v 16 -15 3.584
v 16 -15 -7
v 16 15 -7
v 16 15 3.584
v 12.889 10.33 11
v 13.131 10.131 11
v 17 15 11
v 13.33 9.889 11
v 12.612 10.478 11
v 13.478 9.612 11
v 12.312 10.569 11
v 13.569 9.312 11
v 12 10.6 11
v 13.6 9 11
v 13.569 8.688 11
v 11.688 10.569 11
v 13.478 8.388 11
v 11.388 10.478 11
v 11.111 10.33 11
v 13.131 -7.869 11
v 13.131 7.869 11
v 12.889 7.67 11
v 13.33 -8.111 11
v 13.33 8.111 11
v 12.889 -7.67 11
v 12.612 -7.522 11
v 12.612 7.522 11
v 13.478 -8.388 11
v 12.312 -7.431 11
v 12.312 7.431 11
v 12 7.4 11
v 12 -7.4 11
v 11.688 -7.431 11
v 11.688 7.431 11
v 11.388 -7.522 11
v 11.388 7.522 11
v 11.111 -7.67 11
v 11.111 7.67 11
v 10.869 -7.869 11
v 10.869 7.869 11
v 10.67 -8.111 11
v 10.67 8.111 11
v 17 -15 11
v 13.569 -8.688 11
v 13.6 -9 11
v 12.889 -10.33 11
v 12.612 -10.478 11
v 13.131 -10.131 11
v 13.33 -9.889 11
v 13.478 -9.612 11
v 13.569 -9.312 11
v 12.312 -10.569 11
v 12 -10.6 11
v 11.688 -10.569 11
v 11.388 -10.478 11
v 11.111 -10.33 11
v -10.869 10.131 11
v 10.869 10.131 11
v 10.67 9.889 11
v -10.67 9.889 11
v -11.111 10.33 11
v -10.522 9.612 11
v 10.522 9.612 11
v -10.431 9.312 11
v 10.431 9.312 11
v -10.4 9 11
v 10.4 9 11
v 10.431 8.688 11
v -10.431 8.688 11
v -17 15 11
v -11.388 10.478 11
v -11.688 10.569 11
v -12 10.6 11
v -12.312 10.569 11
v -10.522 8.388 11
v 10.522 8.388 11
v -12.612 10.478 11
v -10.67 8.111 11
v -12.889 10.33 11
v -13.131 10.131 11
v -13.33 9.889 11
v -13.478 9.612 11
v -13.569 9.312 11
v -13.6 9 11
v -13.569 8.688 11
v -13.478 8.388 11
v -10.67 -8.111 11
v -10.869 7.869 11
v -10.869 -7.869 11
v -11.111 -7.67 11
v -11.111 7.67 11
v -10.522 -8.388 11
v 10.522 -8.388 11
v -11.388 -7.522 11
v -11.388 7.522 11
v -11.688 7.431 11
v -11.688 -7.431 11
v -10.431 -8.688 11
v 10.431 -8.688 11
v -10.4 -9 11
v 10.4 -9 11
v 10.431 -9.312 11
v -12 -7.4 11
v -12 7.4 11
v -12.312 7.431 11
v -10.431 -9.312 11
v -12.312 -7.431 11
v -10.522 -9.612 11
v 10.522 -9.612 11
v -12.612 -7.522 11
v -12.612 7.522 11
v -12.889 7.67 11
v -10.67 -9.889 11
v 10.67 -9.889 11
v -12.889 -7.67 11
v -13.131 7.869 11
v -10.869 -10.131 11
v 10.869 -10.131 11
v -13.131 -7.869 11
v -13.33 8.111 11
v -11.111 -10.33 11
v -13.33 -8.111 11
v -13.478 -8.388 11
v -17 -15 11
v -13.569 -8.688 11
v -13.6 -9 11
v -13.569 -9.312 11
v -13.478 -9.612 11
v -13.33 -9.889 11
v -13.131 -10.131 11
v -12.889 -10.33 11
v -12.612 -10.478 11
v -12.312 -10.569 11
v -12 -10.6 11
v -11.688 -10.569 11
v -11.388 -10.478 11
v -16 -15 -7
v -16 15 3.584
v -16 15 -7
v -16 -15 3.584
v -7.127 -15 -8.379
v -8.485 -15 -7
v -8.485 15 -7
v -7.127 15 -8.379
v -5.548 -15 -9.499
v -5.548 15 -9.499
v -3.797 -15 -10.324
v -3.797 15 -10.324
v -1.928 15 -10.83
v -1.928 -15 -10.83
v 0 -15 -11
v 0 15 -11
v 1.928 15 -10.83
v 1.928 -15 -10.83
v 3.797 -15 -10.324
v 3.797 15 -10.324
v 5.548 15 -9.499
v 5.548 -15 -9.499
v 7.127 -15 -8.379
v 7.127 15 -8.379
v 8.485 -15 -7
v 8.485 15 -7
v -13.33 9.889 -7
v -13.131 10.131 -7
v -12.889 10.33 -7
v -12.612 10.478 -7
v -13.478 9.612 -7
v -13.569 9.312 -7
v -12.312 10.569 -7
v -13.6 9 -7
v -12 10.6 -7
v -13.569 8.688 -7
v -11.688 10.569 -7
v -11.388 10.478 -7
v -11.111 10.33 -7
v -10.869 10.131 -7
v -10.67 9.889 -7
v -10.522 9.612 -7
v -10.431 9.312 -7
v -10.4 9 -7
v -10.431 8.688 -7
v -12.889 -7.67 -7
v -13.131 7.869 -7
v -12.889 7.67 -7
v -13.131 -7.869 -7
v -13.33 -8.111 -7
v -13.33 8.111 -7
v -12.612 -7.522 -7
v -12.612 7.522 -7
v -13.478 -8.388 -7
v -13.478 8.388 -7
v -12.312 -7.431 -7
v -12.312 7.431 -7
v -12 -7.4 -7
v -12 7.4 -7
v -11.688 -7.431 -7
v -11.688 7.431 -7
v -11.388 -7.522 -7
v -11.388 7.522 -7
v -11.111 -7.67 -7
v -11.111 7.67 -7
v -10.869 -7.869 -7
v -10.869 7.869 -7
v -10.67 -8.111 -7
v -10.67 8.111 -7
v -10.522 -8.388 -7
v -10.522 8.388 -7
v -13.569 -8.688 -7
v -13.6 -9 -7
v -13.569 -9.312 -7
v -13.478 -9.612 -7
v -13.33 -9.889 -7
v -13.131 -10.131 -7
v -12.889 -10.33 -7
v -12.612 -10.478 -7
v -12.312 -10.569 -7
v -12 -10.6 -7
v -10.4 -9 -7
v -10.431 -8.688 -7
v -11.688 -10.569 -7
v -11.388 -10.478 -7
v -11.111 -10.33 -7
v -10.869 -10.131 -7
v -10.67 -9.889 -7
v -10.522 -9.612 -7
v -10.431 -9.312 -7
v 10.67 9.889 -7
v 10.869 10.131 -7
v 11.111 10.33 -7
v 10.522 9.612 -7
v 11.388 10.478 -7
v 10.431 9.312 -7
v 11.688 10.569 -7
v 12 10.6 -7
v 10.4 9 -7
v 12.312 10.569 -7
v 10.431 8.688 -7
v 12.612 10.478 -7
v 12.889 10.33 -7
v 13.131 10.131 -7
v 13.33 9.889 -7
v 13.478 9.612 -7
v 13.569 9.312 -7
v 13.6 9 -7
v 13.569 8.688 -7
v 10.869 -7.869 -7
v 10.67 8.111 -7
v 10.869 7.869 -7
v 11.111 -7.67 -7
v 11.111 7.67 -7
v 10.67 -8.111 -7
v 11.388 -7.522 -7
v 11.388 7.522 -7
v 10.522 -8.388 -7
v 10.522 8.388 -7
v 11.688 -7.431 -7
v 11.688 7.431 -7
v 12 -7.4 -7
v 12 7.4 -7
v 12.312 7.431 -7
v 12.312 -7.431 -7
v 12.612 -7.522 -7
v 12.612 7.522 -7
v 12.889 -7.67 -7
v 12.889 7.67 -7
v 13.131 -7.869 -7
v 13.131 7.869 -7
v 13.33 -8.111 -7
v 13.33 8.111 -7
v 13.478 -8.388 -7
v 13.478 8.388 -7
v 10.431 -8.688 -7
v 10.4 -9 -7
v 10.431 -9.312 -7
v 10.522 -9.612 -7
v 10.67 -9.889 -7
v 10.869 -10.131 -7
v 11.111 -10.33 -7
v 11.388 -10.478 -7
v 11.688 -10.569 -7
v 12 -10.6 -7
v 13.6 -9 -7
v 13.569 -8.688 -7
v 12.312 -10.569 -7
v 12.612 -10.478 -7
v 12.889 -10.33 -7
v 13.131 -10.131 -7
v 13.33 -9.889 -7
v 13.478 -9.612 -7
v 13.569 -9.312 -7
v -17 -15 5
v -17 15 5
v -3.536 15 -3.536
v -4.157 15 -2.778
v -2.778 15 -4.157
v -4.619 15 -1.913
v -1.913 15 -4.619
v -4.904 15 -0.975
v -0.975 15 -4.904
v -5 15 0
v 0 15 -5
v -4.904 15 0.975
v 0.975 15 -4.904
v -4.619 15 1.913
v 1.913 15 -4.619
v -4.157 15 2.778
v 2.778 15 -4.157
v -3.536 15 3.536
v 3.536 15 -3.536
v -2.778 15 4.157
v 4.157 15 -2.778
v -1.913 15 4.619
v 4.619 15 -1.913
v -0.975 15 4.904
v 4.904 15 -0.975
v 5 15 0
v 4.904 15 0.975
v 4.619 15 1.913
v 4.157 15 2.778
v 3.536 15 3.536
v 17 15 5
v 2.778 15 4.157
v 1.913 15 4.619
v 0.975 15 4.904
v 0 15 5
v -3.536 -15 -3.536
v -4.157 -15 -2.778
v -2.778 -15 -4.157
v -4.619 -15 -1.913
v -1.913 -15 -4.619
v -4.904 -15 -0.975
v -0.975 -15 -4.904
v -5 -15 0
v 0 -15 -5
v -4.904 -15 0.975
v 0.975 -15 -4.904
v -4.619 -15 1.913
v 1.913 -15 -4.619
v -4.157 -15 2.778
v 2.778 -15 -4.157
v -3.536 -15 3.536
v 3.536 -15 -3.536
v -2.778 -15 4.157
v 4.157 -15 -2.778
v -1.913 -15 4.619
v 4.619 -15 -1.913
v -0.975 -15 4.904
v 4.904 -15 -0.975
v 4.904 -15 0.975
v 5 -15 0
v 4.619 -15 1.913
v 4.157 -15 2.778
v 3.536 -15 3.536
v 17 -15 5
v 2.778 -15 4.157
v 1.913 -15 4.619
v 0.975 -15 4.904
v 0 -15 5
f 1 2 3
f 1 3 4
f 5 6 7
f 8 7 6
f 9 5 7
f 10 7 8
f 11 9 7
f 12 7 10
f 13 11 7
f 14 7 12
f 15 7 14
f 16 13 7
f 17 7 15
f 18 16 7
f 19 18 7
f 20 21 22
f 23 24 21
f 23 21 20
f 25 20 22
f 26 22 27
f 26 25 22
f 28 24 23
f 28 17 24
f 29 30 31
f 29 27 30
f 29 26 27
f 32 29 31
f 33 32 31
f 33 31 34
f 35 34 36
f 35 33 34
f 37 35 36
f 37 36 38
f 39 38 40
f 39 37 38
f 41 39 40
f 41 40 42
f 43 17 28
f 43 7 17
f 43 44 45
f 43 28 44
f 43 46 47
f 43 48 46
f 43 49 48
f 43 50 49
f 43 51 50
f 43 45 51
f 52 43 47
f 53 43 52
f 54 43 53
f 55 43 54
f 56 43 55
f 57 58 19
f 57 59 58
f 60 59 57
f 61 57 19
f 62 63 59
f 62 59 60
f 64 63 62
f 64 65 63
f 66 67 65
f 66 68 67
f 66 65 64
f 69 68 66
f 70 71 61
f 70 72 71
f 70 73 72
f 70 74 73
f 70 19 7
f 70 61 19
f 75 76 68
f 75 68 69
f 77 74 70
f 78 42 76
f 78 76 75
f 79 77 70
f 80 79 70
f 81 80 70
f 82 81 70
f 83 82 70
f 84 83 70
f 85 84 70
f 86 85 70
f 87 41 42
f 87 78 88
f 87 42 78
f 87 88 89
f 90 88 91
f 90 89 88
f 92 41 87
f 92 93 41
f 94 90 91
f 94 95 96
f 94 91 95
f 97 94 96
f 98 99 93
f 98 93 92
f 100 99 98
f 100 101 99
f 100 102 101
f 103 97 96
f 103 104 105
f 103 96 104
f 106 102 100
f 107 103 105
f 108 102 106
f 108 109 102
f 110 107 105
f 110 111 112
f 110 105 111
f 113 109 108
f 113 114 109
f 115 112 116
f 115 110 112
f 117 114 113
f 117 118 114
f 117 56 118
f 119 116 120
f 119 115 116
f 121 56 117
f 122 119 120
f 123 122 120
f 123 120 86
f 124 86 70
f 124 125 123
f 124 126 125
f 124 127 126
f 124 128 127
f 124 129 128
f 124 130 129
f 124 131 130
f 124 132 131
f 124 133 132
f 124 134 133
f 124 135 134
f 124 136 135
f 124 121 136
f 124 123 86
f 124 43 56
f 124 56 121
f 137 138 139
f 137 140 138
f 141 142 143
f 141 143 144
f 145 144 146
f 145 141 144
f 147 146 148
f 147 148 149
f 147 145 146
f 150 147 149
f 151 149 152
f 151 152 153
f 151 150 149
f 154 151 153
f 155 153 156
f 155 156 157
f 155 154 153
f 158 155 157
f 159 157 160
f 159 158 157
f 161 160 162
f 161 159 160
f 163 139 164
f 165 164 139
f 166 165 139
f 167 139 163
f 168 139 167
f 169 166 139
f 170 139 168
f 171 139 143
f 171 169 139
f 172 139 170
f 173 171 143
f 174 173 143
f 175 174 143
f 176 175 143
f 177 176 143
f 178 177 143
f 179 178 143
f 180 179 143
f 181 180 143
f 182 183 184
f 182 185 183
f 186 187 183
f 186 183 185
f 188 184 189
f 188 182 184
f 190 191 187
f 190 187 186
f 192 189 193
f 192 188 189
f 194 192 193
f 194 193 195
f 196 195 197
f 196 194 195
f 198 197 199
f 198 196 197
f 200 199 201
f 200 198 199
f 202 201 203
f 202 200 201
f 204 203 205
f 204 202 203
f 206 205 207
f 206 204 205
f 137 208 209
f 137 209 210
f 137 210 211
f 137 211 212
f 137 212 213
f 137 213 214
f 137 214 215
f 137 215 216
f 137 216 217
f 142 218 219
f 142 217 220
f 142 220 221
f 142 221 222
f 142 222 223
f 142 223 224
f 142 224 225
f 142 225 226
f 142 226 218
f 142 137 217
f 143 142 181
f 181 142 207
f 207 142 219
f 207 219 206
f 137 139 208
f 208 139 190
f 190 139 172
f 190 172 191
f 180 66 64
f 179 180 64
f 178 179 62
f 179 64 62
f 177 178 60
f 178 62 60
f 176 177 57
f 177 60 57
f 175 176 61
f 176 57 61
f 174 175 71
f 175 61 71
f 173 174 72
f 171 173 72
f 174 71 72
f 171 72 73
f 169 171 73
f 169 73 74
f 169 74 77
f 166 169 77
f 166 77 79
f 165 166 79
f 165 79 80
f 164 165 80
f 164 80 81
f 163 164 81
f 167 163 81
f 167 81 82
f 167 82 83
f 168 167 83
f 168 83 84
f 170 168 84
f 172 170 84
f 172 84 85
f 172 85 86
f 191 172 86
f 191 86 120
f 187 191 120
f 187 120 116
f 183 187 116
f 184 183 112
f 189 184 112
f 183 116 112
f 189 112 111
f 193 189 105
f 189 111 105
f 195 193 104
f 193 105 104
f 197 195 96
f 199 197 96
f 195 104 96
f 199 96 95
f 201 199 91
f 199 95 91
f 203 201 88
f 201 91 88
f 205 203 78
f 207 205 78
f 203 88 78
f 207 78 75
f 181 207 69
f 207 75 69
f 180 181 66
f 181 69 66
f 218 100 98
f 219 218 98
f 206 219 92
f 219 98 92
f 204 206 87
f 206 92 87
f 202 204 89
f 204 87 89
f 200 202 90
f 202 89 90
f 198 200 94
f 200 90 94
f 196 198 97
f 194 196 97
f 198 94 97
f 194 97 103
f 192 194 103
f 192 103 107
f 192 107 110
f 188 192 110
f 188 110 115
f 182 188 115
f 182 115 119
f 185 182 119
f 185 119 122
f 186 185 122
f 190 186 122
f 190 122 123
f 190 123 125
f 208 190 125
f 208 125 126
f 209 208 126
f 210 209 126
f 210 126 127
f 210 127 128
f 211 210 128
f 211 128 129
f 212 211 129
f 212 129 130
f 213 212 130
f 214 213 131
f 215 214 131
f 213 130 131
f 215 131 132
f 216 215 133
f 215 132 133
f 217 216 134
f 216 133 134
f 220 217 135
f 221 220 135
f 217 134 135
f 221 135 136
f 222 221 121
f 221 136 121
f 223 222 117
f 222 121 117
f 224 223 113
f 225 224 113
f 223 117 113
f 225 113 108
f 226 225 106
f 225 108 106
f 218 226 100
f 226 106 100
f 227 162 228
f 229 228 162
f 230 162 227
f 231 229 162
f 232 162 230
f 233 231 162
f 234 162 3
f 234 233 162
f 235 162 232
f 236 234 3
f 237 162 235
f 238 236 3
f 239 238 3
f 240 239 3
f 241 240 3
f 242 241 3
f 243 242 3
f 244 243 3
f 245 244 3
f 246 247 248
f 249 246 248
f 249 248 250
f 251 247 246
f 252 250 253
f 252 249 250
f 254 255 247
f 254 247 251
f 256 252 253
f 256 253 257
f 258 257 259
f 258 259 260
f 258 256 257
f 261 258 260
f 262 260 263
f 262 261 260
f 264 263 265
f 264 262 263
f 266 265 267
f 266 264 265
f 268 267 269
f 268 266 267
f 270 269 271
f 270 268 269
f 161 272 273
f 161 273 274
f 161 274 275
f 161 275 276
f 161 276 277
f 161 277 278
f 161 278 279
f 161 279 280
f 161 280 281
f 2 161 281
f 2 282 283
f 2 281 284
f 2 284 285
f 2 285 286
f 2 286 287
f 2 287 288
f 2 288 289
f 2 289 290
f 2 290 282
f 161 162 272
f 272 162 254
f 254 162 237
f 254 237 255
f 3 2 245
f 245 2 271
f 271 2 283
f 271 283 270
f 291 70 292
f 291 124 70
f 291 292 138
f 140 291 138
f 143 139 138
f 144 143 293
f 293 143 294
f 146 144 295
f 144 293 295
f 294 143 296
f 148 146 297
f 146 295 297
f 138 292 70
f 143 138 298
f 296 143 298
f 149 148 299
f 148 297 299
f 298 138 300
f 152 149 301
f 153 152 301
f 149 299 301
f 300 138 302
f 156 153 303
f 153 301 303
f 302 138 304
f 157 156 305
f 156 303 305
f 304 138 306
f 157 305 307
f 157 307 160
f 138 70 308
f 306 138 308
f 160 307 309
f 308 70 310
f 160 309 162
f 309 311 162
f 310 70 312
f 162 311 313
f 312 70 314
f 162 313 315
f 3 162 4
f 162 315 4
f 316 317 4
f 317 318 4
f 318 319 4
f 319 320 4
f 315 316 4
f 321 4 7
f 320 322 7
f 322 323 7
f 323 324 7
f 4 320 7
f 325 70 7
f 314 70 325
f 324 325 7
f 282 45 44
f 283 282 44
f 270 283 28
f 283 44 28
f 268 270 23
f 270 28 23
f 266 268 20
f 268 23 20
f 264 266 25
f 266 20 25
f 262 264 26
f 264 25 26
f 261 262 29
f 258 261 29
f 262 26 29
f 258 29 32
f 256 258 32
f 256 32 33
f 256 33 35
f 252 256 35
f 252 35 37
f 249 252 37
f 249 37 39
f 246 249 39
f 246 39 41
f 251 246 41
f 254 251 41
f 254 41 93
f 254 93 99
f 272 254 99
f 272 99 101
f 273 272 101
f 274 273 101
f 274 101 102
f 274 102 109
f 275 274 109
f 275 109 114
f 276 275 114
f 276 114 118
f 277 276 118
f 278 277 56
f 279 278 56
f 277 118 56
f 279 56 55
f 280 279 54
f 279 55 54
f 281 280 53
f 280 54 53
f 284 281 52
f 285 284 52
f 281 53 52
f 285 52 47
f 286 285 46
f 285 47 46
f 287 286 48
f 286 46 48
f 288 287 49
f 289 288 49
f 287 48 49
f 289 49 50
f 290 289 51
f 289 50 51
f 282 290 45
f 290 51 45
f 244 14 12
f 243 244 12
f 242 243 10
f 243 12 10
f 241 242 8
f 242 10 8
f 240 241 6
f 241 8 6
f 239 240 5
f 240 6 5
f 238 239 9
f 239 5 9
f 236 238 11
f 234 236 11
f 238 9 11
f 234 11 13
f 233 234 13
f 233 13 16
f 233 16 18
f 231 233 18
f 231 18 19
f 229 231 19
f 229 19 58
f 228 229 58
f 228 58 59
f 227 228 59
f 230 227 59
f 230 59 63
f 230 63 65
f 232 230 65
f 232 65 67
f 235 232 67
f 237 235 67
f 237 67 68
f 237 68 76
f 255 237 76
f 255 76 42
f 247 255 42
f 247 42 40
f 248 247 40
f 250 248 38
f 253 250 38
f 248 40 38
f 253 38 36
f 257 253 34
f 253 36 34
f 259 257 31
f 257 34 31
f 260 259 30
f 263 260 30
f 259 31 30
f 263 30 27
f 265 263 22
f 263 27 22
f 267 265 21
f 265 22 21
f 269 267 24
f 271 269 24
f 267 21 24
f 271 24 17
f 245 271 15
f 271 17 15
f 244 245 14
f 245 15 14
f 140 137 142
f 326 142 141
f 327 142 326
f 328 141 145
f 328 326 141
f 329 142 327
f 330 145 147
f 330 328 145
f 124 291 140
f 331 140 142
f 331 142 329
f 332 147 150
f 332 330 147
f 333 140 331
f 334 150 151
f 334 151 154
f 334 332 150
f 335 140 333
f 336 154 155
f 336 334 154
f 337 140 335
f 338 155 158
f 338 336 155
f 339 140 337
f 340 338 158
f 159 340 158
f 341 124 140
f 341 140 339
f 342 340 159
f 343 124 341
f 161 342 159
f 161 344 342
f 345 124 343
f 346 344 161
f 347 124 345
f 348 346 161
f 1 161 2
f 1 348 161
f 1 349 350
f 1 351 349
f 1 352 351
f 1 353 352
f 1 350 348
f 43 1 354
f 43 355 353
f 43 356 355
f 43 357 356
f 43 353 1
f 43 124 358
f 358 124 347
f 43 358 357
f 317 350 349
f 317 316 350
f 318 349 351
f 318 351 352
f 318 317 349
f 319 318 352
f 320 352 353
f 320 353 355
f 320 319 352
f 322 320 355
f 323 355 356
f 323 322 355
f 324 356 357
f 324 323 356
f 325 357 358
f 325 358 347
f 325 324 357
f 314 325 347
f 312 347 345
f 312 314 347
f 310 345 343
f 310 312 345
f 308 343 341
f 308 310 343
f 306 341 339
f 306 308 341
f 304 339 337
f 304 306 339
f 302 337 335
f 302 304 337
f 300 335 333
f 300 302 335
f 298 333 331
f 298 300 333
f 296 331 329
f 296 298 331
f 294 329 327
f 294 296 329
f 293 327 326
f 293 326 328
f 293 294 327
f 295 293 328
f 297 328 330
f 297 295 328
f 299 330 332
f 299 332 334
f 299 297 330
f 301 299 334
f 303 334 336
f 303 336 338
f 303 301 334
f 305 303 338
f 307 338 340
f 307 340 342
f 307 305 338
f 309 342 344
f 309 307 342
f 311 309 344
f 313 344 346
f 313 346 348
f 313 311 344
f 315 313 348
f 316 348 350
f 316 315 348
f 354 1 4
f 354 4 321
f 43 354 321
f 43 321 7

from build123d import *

# Parameters (mm, degrees)
F0_R     = 5
F1_DEPTH = 15
F2_R     = 1.6
F3_DEPTH = 25


with BuildPart() as f1:
    # F0 (on Front) → F1 (new body, symmetric)
    with BuildSketch(Plane.XZ):
        with BuildLine():
            Line((-16, -7), (-8.485281, -7))
            ThreePointArc((-8.485281, -7), (0, -11), (8.485281, -7))
            Line((8.485281, -7), (16, -7))
            Line((16, -7), (16, 3.584423))
            Line((16, 3.584423), (17, 5))
            Line((17, 5), (17, 11))
            Line((17, 11), (0, 11))
            Line((0, 11), (-17, 11))
            Line((-17, 11), (-17, 5))
            Line((-17, 5), (-16, 3.584423))
            Line((-16, 3.584423), (-16, -7))
        make_face()
        Circle(F0_R, mode=Mode.SUBTRACT)
    extrude(amount=F1_DEPTH, both=True)

    # F2 (on face) → F3 (cut)
    with BuildSketch(Plane.XY.offset(11)):
        with Locations((-12, -9)):
            Circle(F2_R)
        with Locations((12, -9)):
            Circle(F2_R)
        with Locations((12, 9)):
            Circle(F2_R)
        with Locations((-12, 9)):
            Circle(F2_R)
    extrude(amount=-F3_DEPTH, mode=Mode.SUBTRACT)


solid = f1.part
